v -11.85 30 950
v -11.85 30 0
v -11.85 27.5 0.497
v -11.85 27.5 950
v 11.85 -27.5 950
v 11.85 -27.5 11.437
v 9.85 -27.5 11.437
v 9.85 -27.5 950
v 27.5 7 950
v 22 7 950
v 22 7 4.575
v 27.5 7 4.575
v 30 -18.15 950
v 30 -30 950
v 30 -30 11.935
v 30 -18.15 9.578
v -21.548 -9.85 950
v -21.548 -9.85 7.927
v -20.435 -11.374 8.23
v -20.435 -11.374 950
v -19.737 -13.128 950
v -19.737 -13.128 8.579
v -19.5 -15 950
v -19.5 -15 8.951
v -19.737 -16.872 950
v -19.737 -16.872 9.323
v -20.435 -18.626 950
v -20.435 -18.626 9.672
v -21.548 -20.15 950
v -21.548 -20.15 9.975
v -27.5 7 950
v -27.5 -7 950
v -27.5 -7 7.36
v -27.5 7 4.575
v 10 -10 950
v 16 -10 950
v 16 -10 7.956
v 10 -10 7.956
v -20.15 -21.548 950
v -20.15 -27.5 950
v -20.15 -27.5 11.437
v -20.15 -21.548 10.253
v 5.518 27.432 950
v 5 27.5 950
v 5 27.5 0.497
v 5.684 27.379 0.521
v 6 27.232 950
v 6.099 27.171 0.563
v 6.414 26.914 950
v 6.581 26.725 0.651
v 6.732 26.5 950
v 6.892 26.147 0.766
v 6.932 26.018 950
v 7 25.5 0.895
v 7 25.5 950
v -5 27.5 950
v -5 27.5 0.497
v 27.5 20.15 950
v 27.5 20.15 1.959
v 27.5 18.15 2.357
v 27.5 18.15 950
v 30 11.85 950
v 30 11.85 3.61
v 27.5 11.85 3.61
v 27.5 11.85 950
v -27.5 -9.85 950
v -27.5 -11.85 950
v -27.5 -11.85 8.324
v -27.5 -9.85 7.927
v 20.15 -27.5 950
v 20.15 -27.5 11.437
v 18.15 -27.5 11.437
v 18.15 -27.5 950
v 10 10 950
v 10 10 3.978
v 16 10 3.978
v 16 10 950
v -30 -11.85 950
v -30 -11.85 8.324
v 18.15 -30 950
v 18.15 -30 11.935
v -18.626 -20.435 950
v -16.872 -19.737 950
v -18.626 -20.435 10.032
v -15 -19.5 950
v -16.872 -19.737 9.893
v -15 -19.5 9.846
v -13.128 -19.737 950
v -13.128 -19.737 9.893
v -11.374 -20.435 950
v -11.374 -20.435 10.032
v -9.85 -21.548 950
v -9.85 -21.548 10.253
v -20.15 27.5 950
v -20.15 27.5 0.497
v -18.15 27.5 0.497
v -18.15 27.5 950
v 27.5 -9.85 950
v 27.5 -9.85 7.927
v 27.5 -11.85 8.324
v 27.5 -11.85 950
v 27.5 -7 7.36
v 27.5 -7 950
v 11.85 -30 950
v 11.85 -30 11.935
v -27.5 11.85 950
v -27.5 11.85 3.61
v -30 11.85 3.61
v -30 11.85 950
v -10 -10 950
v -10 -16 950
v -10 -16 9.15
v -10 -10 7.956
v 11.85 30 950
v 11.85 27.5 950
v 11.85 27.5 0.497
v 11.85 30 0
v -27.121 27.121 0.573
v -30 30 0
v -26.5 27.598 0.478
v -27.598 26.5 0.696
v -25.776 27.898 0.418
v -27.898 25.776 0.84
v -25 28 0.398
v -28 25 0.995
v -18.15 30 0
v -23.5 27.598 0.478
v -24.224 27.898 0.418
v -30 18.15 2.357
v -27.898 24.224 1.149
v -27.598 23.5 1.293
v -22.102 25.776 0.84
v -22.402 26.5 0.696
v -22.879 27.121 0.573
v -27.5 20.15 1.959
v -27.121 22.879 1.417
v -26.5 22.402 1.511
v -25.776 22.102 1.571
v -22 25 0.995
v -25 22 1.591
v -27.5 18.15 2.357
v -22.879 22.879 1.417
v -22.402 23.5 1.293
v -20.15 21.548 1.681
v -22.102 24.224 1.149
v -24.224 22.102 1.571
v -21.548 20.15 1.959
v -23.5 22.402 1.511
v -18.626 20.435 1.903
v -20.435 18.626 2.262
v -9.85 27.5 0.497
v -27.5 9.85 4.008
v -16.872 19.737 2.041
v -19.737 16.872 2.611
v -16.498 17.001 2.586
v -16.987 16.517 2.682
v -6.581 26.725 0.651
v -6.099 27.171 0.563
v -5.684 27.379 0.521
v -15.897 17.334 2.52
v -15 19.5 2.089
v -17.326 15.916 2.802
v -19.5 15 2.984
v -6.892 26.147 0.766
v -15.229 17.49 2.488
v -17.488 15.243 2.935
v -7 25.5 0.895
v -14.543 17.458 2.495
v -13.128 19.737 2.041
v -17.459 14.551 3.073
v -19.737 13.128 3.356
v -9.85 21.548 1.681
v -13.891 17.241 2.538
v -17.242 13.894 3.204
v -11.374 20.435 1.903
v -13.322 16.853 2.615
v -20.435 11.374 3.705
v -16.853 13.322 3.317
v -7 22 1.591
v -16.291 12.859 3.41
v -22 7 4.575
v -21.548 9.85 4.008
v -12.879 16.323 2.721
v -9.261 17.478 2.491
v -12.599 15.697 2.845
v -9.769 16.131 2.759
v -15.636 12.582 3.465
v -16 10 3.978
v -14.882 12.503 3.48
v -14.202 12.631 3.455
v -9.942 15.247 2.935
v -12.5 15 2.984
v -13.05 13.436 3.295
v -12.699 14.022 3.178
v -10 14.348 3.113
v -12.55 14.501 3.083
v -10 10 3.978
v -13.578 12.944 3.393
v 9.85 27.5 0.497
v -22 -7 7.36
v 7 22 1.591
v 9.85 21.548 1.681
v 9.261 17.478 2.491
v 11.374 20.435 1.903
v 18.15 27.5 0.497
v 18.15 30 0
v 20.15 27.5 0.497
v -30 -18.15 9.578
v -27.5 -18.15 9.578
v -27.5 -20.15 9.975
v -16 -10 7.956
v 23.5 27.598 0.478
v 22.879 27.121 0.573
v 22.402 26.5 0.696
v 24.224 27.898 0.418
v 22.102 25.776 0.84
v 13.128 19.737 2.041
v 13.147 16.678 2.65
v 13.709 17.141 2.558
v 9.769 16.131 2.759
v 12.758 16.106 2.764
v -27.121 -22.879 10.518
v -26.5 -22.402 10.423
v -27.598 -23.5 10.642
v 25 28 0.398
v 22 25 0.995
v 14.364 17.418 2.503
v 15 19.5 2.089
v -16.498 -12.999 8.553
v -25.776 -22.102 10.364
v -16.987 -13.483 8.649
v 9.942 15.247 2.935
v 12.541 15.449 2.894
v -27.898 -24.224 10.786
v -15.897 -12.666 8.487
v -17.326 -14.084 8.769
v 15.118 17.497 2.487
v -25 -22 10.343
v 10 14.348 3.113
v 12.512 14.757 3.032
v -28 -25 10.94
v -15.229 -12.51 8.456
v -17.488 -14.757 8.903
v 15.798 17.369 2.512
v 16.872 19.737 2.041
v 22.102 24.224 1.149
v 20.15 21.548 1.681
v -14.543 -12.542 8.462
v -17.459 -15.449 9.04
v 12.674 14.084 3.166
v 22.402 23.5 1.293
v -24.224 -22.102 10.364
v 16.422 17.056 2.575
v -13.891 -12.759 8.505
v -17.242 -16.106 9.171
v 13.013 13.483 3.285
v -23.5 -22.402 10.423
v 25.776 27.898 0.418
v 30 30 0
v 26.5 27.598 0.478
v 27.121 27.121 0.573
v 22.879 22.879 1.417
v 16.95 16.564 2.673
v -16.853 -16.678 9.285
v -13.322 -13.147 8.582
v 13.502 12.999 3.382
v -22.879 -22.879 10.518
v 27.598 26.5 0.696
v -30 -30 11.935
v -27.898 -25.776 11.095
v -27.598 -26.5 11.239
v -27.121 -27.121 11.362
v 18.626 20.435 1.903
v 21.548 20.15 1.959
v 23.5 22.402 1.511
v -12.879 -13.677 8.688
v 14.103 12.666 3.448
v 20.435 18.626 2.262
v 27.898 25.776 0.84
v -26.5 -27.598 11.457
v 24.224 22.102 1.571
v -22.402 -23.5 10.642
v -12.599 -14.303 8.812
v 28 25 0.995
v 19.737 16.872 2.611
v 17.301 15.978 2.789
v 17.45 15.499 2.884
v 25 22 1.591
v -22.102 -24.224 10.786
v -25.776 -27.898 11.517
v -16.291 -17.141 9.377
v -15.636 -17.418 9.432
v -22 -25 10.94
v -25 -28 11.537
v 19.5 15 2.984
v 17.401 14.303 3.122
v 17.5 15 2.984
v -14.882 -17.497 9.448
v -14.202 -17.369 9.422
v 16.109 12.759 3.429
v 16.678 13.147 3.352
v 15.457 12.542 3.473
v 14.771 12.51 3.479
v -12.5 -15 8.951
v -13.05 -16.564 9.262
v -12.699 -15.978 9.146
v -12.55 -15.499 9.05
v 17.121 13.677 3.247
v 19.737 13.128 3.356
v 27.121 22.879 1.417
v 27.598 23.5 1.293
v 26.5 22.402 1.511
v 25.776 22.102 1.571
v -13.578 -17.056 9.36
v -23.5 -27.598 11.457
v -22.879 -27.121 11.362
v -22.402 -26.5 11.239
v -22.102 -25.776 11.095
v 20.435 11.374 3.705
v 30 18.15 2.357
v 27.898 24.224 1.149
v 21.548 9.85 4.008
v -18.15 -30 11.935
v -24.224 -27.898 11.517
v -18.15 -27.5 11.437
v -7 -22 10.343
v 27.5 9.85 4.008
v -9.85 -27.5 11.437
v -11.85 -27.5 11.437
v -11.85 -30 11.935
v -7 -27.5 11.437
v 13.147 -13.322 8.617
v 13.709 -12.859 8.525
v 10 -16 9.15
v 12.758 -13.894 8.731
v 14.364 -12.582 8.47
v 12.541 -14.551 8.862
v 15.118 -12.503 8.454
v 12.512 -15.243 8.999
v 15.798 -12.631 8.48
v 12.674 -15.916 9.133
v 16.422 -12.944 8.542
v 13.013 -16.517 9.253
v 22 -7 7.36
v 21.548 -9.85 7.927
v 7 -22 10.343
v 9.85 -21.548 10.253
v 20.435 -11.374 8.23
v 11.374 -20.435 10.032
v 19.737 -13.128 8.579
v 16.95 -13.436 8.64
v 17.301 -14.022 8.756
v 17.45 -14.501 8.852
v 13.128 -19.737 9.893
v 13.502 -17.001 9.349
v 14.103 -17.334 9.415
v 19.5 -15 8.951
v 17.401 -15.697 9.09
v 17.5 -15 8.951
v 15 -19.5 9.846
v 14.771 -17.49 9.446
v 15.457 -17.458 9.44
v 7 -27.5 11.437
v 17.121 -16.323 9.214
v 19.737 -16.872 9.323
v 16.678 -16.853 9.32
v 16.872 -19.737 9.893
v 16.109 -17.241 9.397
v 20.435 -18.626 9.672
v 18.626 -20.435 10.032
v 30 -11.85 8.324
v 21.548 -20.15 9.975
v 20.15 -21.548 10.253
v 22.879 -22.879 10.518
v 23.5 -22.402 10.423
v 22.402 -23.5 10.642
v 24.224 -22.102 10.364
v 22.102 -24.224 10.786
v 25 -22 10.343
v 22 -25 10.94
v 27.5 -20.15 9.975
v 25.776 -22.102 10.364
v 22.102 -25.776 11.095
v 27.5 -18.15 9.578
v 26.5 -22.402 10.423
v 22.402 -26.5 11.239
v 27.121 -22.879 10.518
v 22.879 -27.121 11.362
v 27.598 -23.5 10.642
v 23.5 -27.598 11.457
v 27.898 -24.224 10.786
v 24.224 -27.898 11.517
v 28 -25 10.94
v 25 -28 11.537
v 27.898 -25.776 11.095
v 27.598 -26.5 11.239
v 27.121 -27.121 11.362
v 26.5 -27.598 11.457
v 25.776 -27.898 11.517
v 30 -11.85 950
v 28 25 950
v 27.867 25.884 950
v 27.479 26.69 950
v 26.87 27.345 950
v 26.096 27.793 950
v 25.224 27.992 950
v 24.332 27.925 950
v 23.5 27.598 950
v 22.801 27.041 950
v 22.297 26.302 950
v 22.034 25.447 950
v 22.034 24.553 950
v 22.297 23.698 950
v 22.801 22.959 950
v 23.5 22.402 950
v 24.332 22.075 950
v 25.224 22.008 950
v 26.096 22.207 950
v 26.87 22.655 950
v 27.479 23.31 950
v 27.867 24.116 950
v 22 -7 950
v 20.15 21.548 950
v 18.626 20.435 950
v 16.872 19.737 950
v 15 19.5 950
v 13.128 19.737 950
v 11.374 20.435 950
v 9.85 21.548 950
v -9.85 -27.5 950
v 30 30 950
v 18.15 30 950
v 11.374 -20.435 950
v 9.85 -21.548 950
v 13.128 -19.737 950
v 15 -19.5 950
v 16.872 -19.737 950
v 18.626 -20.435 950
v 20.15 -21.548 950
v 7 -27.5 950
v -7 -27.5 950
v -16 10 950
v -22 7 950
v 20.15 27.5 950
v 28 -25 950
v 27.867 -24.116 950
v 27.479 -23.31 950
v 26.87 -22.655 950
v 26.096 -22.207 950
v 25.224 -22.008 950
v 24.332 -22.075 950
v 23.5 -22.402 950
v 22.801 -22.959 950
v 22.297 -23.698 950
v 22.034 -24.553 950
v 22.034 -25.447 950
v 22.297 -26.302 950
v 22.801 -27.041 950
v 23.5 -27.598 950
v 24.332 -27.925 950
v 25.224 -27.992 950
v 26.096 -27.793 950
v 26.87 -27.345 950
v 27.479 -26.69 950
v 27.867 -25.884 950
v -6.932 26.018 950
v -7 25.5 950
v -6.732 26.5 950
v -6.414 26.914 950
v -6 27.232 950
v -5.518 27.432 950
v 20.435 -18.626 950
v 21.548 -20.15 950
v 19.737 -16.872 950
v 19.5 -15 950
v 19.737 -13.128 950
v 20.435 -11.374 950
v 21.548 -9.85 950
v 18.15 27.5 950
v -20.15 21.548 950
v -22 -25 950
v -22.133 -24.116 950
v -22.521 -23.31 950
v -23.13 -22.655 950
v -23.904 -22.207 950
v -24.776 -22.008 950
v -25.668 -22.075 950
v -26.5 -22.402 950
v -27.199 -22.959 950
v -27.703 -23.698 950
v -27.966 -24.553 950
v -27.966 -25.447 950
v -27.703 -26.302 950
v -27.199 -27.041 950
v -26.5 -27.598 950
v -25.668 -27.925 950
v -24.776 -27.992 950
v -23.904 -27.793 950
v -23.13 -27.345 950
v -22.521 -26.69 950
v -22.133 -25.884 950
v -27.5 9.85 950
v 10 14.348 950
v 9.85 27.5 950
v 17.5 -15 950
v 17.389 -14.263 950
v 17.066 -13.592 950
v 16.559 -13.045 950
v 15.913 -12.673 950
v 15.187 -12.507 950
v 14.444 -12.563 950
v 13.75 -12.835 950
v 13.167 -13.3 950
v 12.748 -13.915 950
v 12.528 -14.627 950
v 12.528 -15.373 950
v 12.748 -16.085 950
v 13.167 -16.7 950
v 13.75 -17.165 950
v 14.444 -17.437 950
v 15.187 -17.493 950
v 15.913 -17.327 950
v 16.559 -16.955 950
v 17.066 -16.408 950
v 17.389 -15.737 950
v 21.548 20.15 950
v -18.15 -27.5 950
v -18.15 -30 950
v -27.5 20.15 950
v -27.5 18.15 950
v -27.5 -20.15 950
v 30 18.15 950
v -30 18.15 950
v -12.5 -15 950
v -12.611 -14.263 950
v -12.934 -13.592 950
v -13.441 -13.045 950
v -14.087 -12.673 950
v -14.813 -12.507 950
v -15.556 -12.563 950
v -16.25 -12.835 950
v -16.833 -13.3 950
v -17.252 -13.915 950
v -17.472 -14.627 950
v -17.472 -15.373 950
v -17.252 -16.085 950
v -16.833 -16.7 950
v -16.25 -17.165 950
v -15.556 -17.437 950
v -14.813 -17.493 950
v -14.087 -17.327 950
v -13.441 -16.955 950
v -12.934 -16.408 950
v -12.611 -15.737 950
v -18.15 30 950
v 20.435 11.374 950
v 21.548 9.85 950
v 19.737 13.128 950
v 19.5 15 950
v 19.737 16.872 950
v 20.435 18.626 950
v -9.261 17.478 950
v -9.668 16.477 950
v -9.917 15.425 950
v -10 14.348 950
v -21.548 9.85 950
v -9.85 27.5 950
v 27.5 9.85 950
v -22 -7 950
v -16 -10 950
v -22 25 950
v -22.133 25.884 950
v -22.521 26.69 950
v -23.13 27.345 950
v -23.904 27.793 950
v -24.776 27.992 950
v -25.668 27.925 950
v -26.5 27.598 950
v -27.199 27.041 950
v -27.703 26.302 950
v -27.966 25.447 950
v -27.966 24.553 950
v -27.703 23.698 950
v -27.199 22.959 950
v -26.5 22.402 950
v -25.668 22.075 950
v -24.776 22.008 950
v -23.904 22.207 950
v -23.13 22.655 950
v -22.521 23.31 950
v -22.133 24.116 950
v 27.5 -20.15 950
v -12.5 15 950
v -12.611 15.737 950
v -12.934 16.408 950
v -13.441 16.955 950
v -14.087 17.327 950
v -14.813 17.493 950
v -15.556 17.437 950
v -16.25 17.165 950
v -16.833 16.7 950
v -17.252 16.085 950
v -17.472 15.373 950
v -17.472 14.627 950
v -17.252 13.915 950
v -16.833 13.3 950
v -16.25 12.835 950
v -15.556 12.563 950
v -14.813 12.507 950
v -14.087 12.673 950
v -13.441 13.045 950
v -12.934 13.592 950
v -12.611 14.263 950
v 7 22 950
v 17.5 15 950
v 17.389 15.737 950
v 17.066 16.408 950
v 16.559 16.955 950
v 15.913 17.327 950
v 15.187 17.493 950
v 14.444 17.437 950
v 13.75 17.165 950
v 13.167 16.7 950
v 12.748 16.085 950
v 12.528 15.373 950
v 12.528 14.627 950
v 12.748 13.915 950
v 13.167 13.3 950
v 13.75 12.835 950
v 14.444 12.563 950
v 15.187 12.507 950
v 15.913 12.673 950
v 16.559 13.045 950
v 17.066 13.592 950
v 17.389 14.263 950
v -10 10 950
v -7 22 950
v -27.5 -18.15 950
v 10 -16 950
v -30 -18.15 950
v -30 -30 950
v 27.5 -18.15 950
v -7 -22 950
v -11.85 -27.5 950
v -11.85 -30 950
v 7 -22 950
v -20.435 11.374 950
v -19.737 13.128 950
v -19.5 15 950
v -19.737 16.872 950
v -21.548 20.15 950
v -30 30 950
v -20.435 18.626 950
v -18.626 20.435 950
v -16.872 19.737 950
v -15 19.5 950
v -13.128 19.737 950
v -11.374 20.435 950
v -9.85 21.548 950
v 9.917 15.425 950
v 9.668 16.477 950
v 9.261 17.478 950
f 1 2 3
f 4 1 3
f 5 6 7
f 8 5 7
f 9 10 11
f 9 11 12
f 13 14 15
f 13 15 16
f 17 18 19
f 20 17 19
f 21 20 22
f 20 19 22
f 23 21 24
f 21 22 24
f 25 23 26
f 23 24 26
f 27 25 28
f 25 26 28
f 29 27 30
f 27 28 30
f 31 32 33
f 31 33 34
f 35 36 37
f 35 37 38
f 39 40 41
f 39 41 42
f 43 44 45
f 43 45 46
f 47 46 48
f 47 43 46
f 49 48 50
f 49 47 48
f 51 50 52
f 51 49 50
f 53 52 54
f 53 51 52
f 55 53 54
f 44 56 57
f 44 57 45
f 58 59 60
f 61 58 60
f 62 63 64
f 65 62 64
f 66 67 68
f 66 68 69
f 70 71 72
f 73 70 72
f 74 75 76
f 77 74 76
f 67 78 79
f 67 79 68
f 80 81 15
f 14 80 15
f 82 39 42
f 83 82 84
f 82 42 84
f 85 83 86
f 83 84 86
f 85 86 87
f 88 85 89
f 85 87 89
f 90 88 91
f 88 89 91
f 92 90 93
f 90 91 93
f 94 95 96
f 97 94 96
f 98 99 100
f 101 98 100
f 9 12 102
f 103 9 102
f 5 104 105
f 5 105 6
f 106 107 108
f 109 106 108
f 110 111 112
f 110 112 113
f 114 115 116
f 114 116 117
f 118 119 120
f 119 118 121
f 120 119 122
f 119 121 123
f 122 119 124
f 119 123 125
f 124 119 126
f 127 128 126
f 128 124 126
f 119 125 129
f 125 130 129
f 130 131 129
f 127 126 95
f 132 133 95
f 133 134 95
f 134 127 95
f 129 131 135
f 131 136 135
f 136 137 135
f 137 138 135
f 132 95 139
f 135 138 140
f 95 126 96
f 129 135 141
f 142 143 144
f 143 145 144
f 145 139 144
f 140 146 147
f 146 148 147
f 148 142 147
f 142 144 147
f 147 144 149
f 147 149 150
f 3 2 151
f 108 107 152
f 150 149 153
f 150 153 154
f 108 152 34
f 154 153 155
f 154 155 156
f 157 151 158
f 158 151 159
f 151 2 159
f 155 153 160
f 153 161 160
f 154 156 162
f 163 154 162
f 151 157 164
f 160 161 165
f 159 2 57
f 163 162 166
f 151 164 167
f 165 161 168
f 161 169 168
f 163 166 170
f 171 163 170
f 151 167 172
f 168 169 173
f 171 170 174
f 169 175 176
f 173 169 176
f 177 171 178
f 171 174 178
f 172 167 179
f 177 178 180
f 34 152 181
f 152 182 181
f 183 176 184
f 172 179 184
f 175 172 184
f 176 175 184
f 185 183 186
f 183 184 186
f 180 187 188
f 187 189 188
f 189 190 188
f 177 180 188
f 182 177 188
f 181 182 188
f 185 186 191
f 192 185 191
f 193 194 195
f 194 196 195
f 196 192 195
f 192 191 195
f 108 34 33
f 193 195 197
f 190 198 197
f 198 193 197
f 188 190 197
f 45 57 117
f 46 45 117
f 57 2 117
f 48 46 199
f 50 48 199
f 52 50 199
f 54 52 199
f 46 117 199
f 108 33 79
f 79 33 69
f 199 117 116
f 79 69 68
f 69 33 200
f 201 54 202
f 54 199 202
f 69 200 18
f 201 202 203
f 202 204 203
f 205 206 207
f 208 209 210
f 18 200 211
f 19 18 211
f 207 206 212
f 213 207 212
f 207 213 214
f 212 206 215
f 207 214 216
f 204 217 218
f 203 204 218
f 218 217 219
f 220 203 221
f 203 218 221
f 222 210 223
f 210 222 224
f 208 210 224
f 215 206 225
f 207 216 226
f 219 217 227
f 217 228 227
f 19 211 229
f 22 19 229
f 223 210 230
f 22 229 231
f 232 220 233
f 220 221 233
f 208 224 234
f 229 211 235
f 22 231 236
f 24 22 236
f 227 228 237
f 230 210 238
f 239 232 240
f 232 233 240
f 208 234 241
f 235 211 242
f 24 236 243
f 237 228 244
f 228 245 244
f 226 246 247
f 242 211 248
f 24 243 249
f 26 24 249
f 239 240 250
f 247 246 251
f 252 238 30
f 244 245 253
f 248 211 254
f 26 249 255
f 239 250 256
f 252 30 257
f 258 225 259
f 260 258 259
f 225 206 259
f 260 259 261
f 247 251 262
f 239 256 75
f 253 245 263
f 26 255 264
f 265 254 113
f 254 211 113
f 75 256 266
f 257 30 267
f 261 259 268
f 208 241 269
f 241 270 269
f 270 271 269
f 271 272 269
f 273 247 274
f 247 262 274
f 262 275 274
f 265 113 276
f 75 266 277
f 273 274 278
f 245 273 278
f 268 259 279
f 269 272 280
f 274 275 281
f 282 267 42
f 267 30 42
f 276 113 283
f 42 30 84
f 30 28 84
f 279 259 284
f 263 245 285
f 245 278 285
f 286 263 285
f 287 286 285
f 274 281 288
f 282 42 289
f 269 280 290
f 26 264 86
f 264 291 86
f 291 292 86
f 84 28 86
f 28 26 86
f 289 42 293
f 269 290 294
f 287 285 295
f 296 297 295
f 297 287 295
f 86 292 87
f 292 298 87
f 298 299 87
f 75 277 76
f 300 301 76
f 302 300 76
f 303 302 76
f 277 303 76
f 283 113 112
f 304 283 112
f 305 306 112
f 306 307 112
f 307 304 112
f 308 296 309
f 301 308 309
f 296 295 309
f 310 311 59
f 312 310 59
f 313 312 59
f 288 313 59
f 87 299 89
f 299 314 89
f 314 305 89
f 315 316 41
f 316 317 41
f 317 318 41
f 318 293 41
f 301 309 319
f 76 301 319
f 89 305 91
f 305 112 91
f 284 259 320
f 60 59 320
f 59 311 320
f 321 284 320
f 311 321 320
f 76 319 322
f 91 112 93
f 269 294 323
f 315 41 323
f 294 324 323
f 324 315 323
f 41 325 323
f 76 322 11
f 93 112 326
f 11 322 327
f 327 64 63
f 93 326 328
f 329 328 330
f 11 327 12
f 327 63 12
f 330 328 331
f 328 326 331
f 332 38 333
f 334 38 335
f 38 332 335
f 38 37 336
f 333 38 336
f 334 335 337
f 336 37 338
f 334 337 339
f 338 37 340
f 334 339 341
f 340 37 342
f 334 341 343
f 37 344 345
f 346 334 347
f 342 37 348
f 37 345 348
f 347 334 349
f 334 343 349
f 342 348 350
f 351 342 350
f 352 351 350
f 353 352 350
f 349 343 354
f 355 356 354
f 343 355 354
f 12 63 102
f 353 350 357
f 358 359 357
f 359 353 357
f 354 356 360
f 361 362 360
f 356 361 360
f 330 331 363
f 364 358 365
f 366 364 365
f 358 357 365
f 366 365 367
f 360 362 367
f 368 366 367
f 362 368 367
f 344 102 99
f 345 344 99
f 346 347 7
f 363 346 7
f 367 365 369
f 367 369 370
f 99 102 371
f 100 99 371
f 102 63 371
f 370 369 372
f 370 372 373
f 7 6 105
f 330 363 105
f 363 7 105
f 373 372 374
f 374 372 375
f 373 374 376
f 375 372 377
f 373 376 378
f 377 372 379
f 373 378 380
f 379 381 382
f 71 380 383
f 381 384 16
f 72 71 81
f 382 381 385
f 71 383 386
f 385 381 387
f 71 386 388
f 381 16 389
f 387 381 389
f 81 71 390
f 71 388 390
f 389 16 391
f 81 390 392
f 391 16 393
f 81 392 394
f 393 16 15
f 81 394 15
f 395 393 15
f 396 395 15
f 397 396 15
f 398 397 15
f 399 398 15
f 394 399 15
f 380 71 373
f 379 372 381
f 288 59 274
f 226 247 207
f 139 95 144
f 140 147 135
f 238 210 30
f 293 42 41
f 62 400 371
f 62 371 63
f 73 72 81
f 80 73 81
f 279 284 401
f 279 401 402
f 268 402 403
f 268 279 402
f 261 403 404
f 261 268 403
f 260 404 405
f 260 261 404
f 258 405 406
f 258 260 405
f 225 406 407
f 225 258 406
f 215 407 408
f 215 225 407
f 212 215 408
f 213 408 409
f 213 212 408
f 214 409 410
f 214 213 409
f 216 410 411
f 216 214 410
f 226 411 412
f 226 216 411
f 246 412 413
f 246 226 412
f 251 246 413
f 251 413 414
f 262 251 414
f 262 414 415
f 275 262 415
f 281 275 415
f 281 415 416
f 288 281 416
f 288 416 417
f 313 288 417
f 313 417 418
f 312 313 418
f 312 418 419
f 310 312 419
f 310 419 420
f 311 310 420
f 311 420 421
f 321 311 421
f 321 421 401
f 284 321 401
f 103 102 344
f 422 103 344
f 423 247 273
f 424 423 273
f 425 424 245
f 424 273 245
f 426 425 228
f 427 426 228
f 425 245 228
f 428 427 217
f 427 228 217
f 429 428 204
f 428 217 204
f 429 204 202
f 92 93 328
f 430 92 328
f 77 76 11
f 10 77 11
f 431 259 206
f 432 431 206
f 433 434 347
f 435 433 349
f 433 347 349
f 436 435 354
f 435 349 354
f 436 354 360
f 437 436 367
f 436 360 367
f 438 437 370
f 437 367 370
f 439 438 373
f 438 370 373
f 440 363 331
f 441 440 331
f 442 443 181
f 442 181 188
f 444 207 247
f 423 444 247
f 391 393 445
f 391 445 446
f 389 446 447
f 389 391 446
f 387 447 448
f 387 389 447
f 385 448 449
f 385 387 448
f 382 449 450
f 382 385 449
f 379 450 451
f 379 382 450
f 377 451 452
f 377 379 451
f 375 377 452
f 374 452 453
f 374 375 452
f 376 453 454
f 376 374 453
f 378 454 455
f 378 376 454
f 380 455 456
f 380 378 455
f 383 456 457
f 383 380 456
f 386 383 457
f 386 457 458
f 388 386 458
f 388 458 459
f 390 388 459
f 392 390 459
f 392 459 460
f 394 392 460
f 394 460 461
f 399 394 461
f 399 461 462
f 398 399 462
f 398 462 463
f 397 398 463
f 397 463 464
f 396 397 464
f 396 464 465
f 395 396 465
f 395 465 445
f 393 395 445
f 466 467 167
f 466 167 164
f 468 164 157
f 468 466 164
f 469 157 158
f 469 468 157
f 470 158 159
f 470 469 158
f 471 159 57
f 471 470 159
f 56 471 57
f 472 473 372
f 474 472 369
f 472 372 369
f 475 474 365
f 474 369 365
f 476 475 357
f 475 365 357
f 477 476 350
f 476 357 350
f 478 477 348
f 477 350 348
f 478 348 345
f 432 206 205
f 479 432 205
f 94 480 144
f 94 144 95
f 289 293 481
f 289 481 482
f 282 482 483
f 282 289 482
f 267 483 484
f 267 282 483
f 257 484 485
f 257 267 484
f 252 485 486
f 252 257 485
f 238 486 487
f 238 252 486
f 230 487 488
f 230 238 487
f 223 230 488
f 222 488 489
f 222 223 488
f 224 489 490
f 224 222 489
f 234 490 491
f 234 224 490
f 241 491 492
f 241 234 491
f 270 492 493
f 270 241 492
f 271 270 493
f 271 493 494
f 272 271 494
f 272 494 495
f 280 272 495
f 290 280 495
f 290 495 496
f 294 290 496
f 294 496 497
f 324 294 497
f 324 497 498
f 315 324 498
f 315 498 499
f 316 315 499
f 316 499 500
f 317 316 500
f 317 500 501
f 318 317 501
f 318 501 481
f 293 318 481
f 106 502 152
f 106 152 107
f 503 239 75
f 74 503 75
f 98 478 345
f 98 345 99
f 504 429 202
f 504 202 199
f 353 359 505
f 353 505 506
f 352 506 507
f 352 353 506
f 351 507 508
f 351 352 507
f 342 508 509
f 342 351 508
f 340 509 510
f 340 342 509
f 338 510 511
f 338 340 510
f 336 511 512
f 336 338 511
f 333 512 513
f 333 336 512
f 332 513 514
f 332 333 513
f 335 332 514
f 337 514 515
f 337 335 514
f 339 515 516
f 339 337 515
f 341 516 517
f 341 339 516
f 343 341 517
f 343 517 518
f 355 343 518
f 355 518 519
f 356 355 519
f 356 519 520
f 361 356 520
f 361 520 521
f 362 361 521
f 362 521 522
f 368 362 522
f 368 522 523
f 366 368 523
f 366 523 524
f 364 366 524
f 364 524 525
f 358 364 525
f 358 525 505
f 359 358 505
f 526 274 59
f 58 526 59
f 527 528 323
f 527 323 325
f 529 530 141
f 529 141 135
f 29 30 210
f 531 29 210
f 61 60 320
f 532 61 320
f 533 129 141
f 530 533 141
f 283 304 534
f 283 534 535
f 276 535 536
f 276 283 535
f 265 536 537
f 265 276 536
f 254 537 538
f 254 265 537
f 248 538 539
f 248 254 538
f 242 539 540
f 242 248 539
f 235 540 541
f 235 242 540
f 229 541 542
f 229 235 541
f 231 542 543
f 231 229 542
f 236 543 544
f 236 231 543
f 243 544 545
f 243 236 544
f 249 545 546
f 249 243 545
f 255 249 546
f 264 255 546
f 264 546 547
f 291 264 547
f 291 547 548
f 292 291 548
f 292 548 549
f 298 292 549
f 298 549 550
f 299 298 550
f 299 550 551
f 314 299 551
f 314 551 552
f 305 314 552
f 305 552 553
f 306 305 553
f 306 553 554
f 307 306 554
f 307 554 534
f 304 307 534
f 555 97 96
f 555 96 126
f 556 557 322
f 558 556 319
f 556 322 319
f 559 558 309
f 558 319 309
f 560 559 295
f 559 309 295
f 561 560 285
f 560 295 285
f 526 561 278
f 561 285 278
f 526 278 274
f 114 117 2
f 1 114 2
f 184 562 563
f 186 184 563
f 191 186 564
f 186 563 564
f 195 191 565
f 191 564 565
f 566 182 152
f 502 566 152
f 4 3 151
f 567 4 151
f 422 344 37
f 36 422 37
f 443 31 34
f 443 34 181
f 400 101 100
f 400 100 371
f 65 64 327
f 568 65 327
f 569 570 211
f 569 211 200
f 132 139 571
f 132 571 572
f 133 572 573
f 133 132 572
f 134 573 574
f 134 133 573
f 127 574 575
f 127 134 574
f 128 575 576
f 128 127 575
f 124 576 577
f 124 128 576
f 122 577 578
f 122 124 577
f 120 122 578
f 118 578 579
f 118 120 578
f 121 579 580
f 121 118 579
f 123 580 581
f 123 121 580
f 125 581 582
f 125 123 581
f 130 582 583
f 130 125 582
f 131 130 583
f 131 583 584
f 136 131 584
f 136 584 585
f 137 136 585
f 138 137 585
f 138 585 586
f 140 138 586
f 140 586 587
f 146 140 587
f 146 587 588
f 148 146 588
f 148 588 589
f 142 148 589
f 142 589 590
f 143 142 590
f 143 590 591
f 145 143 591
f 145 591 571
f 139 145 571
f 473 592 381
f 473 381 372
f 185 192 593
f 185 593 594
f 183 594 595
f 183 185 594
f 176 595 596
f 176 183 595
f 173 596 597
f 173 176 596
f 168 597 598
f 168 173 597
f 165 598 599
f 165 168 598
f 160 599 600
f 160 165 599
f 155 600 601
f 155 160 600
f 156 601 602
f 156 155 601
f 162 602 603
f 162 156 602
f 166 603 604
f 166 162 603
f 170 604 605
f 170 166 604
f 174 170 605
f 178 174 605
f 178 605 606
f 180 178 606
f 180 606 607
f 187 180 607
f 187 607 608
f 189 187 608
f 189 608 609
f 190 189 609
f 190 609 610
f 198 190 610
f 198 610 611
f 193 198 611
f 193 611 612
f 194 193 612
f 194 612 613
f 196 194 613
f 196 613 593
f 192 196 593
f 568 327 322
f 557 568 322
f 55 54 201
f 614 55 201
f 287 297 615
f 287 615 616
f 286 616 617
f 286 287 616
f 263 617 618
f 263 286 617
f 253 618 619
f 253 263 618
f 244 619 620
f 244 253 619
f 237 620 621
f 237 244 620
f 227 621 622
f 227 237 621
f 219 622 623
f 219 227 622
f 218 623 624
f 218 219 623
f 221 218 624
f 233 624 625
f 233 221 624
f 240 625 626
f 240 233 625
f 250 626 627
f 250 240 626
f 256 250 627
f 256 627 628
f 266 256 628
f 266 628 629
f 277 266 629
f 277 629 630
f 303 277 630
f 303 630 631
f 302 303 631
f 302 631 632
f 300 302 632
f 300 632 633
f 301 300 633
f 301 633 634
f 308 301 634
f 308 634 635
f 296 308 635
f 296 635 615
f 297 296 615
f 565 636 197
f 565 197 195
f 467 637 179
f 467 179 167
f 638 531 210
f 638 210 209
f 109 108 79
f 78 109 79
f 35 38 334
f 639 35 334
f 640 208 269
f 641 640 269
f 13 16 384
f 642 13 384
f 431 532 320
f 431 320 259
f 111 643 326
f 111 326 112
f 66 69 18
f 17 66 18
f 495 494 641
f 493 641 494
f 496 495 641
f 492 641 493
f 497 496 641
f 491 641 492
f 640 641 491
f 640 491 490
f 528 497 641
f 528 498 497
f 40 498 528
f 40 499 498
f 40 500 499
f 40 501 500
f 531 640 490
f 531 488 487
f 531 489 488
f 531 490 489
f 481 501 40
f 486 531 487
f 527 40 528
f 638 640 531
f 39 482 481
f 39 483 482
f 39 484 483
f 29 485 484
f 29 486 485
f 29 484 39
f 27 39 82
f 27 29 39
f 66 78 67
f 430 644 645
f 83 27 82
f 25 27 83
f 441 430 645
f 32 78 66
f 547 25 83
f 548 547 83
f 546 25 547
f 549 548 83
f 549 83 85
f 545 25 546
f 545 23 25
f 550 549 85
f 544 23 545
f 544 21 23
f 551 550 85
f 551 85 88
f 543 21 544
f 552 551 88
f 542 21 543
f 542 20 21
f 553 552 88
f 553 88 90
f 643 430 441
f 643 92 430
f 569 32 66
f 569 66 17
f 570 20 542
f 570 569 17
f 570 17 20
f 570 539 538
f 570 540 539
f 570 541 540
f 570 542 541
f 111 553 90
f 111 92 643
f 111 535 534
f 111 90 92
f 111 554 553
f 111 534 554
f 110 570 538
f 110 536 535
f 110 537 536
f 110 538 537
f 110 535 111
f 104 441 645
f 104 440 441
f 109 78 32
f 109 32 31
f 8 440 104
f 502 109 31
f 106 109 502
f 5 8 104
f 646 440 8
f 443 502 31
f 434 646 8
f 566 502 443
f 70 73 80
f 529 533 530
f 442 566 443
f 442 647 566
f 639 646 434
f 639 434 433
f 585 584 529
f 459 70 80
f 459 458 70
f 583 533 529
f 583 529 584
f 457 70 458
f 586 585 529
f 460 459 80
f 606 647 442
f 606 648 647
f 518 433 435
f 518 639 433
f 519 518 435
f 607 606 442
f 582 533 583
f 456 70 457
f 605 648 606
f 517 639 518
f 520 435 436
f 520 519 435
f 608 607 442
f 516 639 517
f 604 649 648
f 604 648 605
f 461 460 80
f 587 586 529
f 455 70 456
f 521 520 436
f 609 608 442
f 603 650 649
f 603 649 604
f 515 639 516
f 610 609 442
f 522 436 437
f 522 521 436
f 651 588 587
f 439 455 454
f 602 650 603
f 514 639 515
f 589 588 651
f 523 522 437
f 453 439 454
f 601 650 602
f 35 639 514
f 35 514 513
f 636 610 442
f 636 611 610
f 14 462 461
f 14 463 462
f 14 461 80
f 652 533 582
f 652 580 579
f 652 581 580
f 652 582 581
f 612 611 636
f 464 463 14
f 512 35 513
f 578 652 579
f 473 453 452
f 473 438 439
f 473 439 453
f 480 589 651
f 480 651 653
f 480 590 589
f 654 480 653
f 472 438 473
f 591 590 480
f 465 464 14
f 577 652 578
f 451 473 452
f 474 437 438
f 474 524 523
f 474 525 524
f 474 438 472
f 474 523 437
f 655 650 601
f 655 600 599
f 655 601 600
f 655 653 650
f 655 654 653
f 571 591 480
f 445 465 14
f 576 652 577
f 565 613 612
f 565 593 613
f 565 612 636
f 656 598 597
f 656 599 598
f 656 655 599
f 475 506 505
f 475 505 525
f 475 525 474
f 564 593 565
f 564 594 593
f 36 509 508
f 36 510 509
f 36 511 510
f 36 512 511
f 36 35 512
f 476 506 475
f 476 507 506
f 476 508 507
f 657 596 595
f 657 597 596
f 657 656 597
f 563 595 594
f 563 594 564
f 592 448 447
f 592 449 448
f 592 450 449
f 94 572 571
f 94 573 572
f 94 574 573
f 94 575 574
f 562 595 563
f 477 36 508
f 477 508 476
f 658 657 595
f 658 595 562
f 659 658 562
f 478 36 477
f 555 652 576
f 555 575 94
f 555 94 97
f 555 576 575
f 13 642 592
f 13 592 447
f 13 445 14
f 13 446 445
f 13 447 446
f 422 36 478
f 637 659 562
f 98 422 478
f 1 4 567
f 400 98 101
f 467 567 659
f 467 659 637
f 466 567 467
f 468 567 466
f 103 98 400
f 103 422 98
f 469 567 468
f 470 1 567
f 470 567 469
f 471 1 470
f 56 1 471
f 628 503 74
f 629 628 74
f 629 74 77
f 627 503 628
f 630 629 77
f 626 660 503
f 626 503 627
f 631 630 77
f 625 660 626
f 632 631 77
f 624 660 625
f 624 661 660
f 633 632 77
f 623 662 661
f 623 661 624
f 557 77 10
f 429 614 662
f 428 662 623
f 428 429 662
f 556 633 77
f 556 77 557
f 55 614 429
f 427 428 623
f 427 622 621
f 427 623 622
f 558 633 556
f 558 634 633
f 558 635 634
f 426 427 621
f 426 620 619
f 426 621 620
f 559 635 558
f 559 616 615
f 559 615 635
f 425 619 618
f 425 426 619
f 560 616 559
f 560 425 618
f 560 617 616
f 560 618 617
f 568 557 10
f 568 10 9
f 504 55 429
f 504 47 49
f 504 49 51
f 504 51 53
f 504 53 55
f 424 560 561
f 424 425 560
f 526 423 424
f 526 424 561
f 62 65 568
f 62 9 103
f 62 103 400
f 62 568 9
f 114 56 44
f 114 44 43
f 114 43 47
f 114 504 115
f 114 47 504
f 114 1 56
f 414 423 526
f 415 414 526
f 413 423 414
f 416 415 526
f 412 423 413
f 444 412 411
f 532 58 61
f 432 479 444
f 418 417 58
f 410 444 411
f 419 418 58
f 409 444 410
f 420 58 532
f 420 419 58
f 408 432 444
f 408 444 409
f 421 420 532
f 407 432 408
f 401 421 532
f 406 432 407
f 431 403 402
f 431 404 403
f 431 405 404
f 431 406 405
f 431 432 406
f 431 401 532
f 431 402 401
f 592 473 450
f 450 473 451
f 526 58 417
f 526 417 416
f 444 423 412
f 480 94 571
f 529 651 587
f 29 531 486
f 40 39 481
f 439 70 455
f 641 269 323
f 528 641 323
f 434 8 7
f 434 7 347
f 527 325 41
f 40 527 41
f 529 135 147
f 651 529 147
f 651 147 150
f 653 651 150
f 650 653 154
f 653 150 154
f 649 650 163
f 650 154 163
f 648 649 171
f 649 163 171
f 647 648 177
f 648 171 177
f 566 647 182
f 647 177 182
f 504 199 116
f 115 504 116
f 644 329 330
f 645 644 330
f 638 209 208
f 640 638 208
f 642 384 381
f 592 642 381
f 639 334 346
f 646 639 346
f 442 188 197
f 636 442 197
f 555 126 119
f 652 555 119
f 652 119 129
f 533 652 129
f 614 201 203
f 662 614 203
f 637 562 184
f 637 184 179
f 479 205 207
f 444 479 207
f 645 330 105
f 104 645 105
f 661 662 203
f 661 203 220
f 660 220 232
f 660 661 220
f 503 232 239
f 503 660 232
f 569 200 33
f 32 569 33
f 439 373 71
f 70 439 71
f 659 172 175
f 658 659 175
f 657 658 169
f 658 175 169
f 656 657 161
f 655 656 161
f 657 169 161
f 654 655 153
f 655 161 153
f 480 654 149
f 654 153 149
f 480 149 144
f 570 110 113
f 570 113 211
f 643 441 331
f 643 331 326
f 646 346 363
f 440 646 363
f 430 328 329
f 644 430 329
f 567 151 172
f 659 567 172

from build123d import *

# Parameters (mm, degrees)
F0_R          = 3
F0_R_2        = 2.5
F1_DEPTH      = 950
F2_R          = 2
F3_R          = 7
F5_DEPTH      = 30
F5_DEPTH_BACK = 30


# Not quite as in the source:
# - a feature names something its author has since deleted; it is built from what else it names


with BuildPart() as f1:
    # F0 (on Top) → F1 (new body)
    with BuildSketch(Plane.XY):
        with BuildLine():
            Line((18.15, -30), (30, -30))
            Line((30, -30), (30, -18.15))
            Line((30, -18.15), (27.5, -18.15))
            Line((27.5, -18.15), (27.5, -20.15))
            Line((27.5, -20.15), (21.5477069044, -20.15))
            ThreePointArc((21.5477069044, -20.15), (19.5, -15), (21.5477069044, -9.85))
            Line((21.5477069044, -9.85), (27.5, -9.85))
            Line((27.5, -9.85), (27.5, -11.85))
            Line((27.5, -11.85), (30, -11.85))
            Line((30, -11.85), (30, 11.85))
            Line((30, 11.85), (27.5, 11.85))
            Line((27.5, 11.85), (27.5, 9.85))
            Line((27.5, 9.85), (21.5477069044, 9.85))
            ThreePointArc((21.5477069044, 9.85), (19.5, 15), (21.5477069044, 20.15))
            Line((21.5477069044, 20.15), (27.5, 20.15))
            Line((27.5, 20.15), (27.5, 18.15))
            Line((27.5, 18.15), (30, 18.15))
            Line((30, 18.15), (30, 30))
            Line((30, 30), (18.15, 30))
            Line((18.15, 30), (18.15, 27.5))
            Line((18.15, 27.5), (20.15, 27.5))
            Line((20.15, 27.5), (20.15, 21.5477069044))
            ThreePointArc((20.15, 21.5477069044), (15, 19.5), (9.85, 21.5477069044))
            Line((9.85, 21.5477069044), (9.85, 27.5))
            Line((9.85, 27.5), (11.85, 27.5))
            Line((11.85, 27.5), (11.85, 30))
            Line((11.85, 30), (-11.85, 30))
            Line((-11.85, 30), (-11.85, 27.5))
            Line((-11.85, 27.5), (-9.85, 27.5))
            Line((-9.85, 27.5), (-9.85, 21.5477069044))
            ThreePointArc((-9.85, 21.5477069044), (-15, 19.5), (-20.15, 21.5477069044))
            Line((-20.15, 21.5477069044), (-20.15, 27.5))
            Line((-20.15, 27.5), (-18.15, 27.5))
            Line((-18.15, 27.5), (-18.15, 30))
            Line((-18.15, 30), (-30, 30))
            Line((-30, 30), (-30, 18.15))
            Line((-30, 18.15), (-27.5, 18.15))
            Line((-27.5, 18.15), (-27.5, 20.15))
            Line((-27.5, 20.15), (-21.5477069044, 20.15))
            ThreePointArc((-21.5477069044, 20.15), (-19.5, 15), (-21.5477069044, 9.85))
            Line((-21.5477069044, 9.85), (-27.5, 9.85))
            Line((-27.5, 9.85), (-27.5, 11.85))
            Line((-27.5, 11.85), (-30, 11.85))
            Line((-30, 11.85), (-30, -11.85))
            Line((-30, -11.85), (-27.5, -11.85))
            Line((-27.5, -11.85), (-27.5, -9.85))
            Line((-27.5, -9.85), (-21.5477069044, -9.85))
            ThreePointArc((-21.5477069044, -9.85), (-19.5, -15), (-21.5477069044, -20.15))
            Line((-21.5477069044, -20.15), (-27.5, -20.15))
            Line((-27.5, -20.15), (-27.5, -18.15))
            Line((-27.5, -18.15), (-30, -18.15))
            Line((-30, -18.15), (-30, -30))
            Line((-30, -30), (-18.15, -30))
            Line((-18.15, -30), (-18.15, -27.5))
            Line((-18.15, -27.5), (-20.15, -27.5))
            Line((-20.15, -27.5), (-20.15, -21.5477069044))
            ThreePointArc((-20.15, -21.5477069044), (-15, -19.5), (-9.85, -21.5477069044))
            Line((-9.85, -21.5477069044), (-9.85, -27.5))
            Line((-9.85, -27.5), (-11.85, -27.5))
            Line((-11.85, -27.5), (-11.85, -30))
            Line((-11.85, -30), (11.85, -30))
            Line((11.85, -30), (11.85, -27.5))
            Line((11.85, -27.5), (9.85, -27.5))
            Line((9.85, -27.5), (9.85, -21.5477069044))
            ThreePointArc((9.85, -21.5477069044), (15, -19.5), (20.15, -21.5477069044))
            Line((20.15, -21.5477069044), (20.15, -27.5))
            Line((20.15, -27.5), (18.15, -27.5))
            Line((18.15, -27.5), (18.15, -30))
        make_face()
        with Locations((-25, -25)):
            Circle(F0_R, mode=Mode.SUBTRACT)
        with Locations((-15, -15)):
            Circle(F0_R_2, mode=Mode.SUBTRACT)
        with Locations((25, -25)):
            Circle(F0_R, mode=Mode.SUBTRACT)
        with Locations((15, -15)):
            Circle(F0_R_2, mode=Mode.SUBTRACT)
        with Locations((-25, 25)):
            Circle(F0_R, mode=Mode.SUBTRACT)
        with Locations((-15, 15)):
            Circle(F0_R_2, mode=Mode.SUBTRACT)
        Polygon((-7, 22), (-7, 27.5), (0, 27.5), (7, 27.5), (7, 22), (10, 16), (10, 10), (16, 10), (22, 7), (27.5, 7), (27.5, 0), (27.5, -7), (22, -7), (16, -10), (10, -10), (10, -16), (7, -22), (7, -27.5), (0, -27.5), (-7, -27.5), (-7, -22), (-10, -16), (-10, -10), (-16, -10), (-22, -7), (-27.5, -7), (-27.5, 0), (-27.5, 7), (-22, 7), (-16, 10), (-10, 10), (-10, 16), align=None, mode=Mode.SUBTRACT)
        with Locations((15, 15)):
            Circle(F0_R_2, mode=Mode.SUBTRACT)
        with Locations((25, 25)):
            Circle(F0_R, mode=Mode.SUBTRACT)
    extrude(amount=F1_DEPTH)

    # F2
    f2_edges = [f1.edges().sort_by_distance(p)[0] for p in [
        (-7, 27.5, 475),
        (7, 27.5, 475),
    ]]
    fillet(f2_edges, radius=F2_R)

    # F3
    f3_edges = [f1.edges().sort_by_distance(p)[0] for p in [
        (-10, 16, 475),
        (10, 16, 475),
    ]]
    fillet(f3_edges, radius=F3_R)

    # F4 (on Right) → F5 (cut, two sides)
    with BuildSketch(Plane.YZ) as f5_sk:
        Polygon((-164.2855995683, 38.6458085579), (-188.5911429791, -83.5464097089), (5.6944565892, -122.1922182668), (30, 0), align=None)
    extrude(amount=F5_DEPTH, mode=Mode.SUBTRACT)
    extrude(f5_sk.sketch, amount=-F5_DEPTH_BACK, mode=Mode.SUBTRACT)


solid = f1.part
